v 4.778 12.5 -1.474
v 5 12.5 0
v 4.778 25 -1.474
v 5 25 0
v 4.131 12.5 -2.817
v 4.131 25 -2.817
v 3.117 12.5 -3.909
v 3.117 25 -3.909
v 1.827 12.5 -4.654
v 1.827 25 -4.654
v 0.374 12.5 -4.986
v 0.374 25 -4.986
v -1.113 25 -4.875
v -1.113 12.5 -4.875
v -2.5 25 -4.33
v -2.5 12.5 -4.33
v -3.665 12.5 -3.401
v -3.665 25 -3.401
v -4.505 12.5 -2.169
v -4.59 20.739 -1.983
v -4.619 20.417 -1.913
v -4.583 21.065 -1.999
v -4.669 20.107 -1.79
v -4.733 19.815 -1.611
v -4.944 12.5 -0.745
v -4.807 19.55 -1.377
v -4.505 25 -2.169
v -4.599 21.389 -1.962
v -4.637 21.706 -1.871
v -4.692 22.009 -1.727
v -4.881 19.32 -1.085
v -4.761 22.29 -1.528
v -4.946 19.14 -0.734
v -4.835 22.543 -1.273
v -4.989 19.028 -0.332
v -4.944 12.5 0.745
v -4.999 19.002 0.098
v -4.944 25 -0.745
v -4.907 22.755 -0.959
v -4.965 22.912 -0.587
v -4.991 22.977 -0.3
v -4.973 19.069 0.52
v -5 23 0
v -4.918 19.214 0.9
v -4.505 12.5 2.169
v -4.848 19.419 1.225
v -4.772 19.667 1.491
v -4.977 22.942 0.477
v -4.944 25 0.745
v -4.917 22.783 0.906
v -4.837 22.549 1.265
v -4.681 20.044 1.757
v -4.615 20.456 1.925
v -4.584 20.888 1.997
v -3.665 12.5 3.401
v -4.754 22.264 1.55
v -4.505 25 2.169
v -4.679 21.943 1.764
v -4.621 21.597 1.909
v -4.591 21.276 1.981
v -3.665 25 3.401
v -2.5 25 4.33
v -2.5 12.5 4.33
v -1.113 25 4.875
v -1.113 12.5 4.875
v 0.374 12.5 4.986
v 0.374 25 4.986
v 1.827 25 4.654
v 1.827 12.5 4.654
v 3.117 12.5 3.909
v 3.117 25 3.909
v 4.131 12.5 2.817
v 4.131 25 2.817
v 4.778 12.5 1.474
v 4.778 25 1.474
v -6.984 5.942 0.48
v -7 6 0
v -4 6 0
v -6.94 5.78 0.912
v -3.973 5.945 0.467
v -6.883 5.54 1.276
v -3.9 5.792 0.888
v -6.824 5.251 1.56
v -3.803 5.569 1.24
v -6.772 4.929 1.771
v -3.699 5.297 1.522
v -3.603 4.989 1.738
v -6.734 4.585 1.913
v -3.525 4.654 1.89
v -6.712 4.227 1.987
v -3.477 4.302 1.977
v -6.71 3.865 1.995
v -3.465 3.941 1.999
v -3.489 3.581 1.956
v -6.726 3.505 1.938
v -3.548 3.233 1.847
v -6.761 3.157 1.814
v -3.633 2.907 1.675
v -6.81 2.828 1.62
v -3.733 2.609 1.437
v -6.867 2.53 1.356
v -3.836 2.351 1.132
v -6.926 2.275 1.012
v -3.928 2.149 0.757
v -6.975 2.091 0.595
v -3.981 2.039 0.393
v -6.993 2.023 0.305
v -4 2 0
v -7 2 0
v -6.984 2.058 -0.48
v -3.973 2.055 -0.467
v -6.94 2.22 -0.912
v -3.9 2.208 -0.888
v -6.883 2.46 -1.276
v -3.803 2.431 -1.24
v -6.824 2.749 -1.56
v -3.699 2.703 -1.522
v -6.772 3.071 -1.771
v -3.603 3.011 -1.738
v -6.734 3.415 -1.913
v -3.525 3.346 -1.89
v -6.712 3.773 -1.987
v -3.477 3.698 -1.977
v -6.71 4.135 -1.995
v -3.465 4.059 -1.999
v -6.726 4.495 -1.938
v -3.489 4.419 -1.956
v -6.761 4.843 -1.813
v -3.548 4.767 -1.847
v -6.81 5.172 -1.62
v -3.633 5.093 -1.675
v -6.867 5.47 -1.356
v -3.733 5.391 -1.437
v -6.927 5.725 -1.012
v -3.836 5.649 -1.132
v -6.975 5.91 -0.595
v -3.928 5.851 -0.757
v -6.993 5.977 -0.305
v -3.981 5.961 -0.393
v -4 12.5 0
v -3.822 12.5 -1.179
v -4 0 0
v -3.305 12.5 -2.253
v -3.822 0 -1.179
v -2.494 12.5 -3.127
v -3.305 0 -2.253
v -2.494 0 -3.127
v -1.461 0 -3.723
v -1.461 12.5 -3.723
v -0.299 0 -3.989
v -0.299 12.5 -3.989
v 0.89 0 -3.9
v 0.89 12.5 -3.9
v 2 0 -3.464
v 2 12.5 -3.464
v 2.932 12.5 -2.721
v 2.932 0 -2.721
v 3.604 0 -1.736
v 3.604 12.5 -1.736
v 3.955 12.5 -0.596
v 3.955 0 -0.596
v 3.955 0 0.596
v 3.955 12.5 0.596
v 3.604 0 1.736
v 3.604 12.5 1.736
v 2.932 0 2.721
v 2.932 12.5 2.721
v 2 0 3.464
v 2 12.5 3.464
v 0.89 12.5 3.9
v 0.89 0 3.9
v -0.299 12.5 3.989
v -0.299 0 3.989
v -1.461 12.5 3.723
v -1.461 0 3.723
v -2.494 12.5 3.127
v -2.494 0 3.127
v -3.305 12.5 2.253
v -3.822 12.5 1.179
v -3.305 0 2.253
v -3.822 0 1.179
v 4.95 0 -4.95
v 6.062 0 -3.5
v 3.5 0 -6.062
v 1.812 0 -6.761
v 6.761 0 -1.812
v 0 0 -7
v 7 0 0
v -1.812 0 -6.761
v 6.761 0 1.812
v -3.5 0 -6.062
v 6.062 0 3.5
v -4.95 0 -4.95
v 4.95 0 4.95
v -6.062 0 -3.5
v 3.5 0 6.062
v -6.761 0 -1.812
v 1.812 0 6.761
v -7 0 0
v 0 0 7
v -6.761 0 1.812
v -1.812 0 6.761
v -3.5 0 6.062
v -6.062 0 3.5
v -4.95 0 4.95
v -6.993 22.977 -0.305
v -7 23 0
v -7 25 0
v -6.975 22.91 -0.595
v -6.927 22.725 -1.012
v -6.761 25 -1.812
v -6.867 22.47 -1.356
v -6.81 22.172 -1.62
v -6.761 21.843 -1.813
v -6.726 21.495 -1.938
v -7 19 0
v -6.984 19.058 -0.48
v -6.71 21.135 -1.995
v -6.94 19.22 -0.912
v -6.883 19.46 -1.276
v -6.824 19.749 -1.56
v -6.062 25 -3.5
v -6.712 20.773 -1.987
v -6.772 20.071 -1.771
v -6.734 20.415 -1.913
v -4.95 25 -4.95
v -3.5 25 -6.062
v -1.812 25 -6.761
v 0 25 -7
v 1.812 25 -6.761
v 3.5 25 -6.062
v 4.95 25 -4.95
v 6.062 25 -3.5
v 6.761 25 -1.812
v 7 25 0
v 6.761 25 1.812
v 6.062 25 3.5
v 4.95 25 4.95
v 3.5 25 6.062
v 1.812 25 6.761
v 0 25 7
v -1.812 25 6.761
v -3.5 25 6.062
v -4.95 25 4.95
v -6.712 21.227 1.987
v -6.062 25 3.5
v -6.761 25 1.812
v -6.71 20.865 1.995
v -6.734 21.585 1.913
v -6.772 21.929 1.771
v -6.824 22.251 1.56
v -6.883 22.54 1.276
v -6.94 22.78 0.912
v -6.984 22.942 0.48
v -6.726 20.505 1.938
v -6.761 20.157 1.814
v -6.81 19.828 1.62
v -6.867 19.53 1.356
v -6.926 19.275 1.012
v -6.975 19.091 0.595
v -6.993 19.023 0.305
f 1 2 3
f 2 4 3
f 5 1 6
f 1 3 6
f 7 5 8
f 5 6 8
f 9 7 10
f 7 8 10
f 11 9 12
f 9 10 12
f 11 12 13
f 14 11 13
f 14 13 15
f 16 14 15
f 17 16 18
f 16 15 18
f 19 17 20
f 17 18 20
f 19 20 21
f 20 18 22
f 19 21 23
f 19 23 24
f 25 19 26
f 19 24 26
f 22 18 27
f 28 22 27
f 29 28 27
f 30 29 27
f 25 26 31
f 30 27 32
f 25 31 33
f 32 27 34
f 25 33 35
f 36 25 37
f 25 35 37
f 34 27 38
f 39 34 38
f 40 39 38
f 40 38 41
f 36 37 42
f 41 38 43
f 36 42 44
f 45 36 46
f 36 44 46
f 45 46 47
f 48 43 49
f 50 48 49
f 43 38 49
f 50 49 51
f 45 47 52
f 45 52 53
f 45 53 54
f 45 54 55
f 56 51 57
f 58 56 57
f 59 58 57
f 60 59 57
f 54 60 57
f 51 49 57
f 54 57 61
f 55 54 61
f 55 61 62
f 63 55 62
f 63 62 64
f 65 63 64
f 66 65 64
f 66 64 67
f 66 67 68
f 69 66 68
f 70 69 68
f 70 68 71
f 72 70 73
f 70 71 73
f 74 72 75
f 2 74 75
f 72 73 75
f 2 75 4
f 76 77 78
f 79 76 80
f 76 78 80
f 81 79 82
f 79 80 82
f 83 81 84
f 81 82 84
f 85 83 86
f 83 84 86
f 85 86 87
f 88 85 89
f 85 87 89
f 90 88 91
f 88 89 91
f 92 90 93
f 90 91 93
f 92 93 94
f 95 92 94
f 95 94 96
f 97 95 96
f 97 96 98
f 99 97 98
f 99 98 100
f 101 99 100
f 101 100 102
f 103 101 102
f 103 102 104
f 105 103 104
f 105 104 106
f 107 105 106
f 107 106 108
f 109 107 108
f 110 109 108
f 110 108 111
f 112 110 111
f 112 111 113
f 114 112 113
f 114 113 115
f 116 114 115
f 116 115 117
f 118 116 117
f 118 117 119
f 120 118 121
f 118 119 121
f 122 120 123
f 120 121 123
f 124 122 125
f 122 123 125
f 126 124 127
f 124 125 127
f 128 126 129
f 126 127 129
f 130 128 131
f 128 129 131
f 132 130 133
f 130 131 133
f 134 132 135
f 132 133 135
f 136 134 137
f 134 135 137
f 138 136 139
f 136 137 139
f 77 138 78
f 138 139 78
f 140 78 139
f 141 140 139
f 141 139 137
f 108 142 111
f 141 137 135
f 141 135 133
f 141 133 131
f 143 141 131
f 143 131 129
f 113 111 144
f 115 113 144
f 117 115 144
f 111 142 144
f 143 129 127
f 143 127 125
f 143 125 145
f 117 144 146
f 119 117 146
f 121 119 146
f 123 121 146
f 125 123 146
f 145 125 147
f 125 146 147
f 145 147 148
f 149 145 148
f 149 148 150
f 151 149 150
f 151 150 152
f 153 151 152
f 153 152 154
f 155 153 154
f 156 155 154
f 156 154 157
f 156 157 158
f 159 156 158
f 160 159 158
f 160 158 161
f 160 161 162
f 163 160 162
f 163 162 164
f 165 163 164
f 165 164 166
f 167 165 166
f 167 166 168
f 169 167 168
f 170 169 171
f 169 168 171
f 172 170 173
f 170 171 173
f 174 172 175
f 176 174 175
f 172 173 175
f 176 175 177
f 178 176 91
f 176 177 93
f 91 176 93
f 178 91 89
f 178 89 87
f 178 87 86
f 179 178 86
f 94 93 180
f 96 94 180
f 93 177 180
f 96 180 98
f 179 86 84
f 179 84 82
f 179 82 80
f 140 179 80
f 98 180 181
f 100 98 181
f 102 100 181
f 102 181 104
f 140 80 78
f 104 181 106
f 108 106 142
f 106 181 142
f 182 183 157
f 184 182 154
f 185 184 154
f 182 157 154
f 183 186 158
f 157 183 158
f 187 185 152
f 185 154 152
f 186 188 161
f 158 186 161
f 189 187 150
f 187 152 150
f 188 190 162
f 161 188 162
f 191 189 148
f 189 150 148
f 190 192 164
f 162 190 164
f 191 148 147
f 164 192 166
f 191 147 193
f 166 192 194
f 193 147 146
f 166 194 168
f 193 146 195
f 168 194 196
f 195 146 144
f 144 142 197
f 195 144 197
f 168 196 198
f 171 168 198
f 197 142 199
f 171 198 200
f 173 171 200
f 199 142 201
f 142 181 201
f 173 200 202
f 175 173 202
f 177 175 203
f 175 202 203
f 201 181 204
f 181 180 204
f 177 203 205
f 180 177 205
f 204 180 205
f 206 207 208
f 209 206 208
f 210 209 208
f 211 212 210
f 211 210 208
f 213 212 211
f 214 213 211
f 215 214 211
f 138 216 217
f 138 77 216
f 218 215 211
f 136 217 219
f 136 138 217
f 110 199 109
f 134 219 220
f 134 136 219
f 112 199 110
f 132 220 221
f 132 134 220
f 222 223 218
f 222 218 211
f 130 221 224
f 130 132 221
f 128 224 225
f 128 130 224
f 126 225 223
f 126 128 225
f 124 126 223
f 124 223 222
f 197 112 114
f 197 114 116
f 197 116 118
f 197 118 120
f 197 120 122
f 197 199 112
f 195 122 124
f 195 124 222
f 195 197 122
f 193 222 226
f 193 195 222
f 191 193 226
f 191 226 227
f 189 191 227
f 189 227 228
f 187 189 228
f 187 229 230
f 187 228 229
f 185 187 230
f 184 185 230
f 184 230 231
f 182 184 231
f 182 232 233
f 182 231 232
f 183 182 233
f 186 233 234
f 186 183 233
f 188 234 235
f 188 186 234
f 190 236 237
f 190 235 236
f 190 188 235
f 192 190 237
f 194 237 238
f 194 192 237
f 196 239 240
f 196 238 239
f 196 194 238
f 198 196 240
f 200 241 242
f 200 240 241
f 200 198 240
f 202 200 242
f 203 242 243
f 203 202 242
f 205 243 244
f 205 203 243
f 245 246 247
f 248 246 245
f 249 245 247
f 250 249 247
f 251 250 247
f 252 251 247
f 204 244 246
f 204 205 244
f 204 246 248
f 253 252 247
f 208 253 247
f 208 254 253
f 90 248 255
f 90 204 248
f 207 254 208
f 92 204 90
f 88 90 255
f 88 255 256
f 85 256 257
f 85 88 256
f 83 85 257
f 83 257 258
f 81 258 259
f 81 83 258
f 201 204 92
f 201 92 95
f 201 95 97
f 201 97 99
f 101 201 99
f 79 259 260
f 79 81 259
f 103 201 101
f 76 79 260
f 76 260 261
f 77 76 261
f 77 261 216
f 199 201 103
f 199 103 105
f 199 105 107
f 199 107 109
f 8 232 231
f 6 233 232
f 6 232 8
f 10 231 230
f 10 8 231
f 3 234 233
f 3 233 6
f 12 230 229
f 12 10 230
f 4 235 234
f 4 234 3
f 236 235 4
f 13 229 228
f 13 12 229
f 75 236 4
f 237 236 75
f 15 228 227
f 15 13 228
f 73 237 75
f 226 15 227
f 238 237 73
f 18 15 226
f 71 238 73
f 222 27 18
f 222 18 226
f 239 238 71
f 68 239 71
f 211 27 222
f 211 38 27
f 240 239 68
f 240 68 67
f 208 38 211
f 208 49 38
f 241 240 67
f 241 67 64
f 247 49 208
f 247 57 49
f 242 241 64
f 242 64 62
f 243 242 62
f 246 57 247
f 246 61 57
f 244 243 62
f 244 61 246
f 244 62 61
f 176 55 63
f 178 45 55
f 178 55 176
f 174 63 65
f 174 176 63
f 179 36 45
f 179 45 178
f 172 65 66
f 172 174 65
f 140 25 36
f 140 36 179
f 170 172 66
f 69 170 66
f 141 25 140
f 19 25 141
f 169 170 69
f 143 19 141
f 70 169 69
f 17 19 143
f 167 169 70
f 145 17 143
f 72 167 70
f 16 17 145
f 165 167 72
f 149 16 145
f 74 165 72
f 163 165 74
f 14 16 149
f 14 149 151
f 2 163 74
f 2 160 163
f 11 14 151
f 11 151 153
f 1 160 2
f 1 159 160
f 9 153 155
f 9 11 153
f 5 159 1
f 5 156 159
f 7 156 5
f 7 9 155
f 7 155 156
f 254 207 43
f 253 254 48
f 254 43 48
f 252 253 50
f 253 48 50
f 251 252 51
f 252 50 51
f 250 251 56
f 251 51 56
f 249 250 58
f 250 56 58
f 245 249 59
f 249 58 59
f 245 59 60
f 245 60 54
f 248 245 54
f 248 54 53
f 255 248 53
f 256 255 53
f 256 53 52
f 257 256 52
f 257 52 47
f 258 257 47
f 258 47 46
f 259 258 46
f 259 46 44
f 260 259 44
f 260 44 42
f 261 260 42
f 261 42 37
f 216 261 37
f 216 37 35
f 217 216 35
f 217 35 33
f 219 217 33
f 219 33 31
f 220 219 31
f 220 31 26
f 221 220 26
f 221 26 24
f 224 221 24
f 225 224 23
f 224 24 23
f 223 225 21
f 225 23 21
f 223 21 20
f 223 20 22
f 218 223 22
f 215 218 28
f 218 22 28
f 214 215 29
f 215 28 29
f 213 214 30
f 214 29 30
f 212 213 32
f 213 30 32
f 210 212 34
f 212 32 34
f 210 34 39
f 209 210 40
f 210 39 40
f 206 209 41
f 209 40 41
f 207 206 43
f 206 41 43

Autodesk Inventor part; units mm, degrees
ref_plane "YZ Plane" through (0, 0, 0) normal (1, 0, 0) x (0, 1, 0)
ref_plane "XZ Plane" through (0, 0, 0) normal (0, 1, 0) x (-1, 0, 0)
ref_plane "XY Plane" through (0, 0, 0) normal (0, 0, 1) x (1, 0, 0)
sketch "Sketch1" plane through (0, 0, 0) normal (0, 1, 0) x (-1, 0, 0)
  circle A0 centre (0, 0) radius 7
  circle A1 centre (0, 0) radius 4
  dimension "d0" = 14
  dimension "d1" = 8
extrude "Extrusion1" add sketch "Sketch1" along normal blind 25
sketch "Sketch2" plane through (0, 25, 0) normal (0, 1, 0) x (1, 0, 0)
  circle A0 centre (0, 0) radius 5
  dimension "d4" = 10
extrude "Extrusion2" cut sketch "Sketch2" against normal blind 12.5
sketch "Sketch3" plane through (0, 0, 0) normal (1, 0, 0) x (0, 1, 0)
  circle A0 centre (4, 0) radius 2
  circle A1 centre (21, 0) radius 2
  line L0 (25, -7) -> (25, 7) projected
  point P0 (0, 0)
  dimension "d7" = 4
  dimension "d8" = 4
  dimension "d9" = 4
  dimension "d10" = 4
extrude "Extrusion3" cut sketch "Sketch3" against normal blind 25
properties part number "Khớp nối cứng"
